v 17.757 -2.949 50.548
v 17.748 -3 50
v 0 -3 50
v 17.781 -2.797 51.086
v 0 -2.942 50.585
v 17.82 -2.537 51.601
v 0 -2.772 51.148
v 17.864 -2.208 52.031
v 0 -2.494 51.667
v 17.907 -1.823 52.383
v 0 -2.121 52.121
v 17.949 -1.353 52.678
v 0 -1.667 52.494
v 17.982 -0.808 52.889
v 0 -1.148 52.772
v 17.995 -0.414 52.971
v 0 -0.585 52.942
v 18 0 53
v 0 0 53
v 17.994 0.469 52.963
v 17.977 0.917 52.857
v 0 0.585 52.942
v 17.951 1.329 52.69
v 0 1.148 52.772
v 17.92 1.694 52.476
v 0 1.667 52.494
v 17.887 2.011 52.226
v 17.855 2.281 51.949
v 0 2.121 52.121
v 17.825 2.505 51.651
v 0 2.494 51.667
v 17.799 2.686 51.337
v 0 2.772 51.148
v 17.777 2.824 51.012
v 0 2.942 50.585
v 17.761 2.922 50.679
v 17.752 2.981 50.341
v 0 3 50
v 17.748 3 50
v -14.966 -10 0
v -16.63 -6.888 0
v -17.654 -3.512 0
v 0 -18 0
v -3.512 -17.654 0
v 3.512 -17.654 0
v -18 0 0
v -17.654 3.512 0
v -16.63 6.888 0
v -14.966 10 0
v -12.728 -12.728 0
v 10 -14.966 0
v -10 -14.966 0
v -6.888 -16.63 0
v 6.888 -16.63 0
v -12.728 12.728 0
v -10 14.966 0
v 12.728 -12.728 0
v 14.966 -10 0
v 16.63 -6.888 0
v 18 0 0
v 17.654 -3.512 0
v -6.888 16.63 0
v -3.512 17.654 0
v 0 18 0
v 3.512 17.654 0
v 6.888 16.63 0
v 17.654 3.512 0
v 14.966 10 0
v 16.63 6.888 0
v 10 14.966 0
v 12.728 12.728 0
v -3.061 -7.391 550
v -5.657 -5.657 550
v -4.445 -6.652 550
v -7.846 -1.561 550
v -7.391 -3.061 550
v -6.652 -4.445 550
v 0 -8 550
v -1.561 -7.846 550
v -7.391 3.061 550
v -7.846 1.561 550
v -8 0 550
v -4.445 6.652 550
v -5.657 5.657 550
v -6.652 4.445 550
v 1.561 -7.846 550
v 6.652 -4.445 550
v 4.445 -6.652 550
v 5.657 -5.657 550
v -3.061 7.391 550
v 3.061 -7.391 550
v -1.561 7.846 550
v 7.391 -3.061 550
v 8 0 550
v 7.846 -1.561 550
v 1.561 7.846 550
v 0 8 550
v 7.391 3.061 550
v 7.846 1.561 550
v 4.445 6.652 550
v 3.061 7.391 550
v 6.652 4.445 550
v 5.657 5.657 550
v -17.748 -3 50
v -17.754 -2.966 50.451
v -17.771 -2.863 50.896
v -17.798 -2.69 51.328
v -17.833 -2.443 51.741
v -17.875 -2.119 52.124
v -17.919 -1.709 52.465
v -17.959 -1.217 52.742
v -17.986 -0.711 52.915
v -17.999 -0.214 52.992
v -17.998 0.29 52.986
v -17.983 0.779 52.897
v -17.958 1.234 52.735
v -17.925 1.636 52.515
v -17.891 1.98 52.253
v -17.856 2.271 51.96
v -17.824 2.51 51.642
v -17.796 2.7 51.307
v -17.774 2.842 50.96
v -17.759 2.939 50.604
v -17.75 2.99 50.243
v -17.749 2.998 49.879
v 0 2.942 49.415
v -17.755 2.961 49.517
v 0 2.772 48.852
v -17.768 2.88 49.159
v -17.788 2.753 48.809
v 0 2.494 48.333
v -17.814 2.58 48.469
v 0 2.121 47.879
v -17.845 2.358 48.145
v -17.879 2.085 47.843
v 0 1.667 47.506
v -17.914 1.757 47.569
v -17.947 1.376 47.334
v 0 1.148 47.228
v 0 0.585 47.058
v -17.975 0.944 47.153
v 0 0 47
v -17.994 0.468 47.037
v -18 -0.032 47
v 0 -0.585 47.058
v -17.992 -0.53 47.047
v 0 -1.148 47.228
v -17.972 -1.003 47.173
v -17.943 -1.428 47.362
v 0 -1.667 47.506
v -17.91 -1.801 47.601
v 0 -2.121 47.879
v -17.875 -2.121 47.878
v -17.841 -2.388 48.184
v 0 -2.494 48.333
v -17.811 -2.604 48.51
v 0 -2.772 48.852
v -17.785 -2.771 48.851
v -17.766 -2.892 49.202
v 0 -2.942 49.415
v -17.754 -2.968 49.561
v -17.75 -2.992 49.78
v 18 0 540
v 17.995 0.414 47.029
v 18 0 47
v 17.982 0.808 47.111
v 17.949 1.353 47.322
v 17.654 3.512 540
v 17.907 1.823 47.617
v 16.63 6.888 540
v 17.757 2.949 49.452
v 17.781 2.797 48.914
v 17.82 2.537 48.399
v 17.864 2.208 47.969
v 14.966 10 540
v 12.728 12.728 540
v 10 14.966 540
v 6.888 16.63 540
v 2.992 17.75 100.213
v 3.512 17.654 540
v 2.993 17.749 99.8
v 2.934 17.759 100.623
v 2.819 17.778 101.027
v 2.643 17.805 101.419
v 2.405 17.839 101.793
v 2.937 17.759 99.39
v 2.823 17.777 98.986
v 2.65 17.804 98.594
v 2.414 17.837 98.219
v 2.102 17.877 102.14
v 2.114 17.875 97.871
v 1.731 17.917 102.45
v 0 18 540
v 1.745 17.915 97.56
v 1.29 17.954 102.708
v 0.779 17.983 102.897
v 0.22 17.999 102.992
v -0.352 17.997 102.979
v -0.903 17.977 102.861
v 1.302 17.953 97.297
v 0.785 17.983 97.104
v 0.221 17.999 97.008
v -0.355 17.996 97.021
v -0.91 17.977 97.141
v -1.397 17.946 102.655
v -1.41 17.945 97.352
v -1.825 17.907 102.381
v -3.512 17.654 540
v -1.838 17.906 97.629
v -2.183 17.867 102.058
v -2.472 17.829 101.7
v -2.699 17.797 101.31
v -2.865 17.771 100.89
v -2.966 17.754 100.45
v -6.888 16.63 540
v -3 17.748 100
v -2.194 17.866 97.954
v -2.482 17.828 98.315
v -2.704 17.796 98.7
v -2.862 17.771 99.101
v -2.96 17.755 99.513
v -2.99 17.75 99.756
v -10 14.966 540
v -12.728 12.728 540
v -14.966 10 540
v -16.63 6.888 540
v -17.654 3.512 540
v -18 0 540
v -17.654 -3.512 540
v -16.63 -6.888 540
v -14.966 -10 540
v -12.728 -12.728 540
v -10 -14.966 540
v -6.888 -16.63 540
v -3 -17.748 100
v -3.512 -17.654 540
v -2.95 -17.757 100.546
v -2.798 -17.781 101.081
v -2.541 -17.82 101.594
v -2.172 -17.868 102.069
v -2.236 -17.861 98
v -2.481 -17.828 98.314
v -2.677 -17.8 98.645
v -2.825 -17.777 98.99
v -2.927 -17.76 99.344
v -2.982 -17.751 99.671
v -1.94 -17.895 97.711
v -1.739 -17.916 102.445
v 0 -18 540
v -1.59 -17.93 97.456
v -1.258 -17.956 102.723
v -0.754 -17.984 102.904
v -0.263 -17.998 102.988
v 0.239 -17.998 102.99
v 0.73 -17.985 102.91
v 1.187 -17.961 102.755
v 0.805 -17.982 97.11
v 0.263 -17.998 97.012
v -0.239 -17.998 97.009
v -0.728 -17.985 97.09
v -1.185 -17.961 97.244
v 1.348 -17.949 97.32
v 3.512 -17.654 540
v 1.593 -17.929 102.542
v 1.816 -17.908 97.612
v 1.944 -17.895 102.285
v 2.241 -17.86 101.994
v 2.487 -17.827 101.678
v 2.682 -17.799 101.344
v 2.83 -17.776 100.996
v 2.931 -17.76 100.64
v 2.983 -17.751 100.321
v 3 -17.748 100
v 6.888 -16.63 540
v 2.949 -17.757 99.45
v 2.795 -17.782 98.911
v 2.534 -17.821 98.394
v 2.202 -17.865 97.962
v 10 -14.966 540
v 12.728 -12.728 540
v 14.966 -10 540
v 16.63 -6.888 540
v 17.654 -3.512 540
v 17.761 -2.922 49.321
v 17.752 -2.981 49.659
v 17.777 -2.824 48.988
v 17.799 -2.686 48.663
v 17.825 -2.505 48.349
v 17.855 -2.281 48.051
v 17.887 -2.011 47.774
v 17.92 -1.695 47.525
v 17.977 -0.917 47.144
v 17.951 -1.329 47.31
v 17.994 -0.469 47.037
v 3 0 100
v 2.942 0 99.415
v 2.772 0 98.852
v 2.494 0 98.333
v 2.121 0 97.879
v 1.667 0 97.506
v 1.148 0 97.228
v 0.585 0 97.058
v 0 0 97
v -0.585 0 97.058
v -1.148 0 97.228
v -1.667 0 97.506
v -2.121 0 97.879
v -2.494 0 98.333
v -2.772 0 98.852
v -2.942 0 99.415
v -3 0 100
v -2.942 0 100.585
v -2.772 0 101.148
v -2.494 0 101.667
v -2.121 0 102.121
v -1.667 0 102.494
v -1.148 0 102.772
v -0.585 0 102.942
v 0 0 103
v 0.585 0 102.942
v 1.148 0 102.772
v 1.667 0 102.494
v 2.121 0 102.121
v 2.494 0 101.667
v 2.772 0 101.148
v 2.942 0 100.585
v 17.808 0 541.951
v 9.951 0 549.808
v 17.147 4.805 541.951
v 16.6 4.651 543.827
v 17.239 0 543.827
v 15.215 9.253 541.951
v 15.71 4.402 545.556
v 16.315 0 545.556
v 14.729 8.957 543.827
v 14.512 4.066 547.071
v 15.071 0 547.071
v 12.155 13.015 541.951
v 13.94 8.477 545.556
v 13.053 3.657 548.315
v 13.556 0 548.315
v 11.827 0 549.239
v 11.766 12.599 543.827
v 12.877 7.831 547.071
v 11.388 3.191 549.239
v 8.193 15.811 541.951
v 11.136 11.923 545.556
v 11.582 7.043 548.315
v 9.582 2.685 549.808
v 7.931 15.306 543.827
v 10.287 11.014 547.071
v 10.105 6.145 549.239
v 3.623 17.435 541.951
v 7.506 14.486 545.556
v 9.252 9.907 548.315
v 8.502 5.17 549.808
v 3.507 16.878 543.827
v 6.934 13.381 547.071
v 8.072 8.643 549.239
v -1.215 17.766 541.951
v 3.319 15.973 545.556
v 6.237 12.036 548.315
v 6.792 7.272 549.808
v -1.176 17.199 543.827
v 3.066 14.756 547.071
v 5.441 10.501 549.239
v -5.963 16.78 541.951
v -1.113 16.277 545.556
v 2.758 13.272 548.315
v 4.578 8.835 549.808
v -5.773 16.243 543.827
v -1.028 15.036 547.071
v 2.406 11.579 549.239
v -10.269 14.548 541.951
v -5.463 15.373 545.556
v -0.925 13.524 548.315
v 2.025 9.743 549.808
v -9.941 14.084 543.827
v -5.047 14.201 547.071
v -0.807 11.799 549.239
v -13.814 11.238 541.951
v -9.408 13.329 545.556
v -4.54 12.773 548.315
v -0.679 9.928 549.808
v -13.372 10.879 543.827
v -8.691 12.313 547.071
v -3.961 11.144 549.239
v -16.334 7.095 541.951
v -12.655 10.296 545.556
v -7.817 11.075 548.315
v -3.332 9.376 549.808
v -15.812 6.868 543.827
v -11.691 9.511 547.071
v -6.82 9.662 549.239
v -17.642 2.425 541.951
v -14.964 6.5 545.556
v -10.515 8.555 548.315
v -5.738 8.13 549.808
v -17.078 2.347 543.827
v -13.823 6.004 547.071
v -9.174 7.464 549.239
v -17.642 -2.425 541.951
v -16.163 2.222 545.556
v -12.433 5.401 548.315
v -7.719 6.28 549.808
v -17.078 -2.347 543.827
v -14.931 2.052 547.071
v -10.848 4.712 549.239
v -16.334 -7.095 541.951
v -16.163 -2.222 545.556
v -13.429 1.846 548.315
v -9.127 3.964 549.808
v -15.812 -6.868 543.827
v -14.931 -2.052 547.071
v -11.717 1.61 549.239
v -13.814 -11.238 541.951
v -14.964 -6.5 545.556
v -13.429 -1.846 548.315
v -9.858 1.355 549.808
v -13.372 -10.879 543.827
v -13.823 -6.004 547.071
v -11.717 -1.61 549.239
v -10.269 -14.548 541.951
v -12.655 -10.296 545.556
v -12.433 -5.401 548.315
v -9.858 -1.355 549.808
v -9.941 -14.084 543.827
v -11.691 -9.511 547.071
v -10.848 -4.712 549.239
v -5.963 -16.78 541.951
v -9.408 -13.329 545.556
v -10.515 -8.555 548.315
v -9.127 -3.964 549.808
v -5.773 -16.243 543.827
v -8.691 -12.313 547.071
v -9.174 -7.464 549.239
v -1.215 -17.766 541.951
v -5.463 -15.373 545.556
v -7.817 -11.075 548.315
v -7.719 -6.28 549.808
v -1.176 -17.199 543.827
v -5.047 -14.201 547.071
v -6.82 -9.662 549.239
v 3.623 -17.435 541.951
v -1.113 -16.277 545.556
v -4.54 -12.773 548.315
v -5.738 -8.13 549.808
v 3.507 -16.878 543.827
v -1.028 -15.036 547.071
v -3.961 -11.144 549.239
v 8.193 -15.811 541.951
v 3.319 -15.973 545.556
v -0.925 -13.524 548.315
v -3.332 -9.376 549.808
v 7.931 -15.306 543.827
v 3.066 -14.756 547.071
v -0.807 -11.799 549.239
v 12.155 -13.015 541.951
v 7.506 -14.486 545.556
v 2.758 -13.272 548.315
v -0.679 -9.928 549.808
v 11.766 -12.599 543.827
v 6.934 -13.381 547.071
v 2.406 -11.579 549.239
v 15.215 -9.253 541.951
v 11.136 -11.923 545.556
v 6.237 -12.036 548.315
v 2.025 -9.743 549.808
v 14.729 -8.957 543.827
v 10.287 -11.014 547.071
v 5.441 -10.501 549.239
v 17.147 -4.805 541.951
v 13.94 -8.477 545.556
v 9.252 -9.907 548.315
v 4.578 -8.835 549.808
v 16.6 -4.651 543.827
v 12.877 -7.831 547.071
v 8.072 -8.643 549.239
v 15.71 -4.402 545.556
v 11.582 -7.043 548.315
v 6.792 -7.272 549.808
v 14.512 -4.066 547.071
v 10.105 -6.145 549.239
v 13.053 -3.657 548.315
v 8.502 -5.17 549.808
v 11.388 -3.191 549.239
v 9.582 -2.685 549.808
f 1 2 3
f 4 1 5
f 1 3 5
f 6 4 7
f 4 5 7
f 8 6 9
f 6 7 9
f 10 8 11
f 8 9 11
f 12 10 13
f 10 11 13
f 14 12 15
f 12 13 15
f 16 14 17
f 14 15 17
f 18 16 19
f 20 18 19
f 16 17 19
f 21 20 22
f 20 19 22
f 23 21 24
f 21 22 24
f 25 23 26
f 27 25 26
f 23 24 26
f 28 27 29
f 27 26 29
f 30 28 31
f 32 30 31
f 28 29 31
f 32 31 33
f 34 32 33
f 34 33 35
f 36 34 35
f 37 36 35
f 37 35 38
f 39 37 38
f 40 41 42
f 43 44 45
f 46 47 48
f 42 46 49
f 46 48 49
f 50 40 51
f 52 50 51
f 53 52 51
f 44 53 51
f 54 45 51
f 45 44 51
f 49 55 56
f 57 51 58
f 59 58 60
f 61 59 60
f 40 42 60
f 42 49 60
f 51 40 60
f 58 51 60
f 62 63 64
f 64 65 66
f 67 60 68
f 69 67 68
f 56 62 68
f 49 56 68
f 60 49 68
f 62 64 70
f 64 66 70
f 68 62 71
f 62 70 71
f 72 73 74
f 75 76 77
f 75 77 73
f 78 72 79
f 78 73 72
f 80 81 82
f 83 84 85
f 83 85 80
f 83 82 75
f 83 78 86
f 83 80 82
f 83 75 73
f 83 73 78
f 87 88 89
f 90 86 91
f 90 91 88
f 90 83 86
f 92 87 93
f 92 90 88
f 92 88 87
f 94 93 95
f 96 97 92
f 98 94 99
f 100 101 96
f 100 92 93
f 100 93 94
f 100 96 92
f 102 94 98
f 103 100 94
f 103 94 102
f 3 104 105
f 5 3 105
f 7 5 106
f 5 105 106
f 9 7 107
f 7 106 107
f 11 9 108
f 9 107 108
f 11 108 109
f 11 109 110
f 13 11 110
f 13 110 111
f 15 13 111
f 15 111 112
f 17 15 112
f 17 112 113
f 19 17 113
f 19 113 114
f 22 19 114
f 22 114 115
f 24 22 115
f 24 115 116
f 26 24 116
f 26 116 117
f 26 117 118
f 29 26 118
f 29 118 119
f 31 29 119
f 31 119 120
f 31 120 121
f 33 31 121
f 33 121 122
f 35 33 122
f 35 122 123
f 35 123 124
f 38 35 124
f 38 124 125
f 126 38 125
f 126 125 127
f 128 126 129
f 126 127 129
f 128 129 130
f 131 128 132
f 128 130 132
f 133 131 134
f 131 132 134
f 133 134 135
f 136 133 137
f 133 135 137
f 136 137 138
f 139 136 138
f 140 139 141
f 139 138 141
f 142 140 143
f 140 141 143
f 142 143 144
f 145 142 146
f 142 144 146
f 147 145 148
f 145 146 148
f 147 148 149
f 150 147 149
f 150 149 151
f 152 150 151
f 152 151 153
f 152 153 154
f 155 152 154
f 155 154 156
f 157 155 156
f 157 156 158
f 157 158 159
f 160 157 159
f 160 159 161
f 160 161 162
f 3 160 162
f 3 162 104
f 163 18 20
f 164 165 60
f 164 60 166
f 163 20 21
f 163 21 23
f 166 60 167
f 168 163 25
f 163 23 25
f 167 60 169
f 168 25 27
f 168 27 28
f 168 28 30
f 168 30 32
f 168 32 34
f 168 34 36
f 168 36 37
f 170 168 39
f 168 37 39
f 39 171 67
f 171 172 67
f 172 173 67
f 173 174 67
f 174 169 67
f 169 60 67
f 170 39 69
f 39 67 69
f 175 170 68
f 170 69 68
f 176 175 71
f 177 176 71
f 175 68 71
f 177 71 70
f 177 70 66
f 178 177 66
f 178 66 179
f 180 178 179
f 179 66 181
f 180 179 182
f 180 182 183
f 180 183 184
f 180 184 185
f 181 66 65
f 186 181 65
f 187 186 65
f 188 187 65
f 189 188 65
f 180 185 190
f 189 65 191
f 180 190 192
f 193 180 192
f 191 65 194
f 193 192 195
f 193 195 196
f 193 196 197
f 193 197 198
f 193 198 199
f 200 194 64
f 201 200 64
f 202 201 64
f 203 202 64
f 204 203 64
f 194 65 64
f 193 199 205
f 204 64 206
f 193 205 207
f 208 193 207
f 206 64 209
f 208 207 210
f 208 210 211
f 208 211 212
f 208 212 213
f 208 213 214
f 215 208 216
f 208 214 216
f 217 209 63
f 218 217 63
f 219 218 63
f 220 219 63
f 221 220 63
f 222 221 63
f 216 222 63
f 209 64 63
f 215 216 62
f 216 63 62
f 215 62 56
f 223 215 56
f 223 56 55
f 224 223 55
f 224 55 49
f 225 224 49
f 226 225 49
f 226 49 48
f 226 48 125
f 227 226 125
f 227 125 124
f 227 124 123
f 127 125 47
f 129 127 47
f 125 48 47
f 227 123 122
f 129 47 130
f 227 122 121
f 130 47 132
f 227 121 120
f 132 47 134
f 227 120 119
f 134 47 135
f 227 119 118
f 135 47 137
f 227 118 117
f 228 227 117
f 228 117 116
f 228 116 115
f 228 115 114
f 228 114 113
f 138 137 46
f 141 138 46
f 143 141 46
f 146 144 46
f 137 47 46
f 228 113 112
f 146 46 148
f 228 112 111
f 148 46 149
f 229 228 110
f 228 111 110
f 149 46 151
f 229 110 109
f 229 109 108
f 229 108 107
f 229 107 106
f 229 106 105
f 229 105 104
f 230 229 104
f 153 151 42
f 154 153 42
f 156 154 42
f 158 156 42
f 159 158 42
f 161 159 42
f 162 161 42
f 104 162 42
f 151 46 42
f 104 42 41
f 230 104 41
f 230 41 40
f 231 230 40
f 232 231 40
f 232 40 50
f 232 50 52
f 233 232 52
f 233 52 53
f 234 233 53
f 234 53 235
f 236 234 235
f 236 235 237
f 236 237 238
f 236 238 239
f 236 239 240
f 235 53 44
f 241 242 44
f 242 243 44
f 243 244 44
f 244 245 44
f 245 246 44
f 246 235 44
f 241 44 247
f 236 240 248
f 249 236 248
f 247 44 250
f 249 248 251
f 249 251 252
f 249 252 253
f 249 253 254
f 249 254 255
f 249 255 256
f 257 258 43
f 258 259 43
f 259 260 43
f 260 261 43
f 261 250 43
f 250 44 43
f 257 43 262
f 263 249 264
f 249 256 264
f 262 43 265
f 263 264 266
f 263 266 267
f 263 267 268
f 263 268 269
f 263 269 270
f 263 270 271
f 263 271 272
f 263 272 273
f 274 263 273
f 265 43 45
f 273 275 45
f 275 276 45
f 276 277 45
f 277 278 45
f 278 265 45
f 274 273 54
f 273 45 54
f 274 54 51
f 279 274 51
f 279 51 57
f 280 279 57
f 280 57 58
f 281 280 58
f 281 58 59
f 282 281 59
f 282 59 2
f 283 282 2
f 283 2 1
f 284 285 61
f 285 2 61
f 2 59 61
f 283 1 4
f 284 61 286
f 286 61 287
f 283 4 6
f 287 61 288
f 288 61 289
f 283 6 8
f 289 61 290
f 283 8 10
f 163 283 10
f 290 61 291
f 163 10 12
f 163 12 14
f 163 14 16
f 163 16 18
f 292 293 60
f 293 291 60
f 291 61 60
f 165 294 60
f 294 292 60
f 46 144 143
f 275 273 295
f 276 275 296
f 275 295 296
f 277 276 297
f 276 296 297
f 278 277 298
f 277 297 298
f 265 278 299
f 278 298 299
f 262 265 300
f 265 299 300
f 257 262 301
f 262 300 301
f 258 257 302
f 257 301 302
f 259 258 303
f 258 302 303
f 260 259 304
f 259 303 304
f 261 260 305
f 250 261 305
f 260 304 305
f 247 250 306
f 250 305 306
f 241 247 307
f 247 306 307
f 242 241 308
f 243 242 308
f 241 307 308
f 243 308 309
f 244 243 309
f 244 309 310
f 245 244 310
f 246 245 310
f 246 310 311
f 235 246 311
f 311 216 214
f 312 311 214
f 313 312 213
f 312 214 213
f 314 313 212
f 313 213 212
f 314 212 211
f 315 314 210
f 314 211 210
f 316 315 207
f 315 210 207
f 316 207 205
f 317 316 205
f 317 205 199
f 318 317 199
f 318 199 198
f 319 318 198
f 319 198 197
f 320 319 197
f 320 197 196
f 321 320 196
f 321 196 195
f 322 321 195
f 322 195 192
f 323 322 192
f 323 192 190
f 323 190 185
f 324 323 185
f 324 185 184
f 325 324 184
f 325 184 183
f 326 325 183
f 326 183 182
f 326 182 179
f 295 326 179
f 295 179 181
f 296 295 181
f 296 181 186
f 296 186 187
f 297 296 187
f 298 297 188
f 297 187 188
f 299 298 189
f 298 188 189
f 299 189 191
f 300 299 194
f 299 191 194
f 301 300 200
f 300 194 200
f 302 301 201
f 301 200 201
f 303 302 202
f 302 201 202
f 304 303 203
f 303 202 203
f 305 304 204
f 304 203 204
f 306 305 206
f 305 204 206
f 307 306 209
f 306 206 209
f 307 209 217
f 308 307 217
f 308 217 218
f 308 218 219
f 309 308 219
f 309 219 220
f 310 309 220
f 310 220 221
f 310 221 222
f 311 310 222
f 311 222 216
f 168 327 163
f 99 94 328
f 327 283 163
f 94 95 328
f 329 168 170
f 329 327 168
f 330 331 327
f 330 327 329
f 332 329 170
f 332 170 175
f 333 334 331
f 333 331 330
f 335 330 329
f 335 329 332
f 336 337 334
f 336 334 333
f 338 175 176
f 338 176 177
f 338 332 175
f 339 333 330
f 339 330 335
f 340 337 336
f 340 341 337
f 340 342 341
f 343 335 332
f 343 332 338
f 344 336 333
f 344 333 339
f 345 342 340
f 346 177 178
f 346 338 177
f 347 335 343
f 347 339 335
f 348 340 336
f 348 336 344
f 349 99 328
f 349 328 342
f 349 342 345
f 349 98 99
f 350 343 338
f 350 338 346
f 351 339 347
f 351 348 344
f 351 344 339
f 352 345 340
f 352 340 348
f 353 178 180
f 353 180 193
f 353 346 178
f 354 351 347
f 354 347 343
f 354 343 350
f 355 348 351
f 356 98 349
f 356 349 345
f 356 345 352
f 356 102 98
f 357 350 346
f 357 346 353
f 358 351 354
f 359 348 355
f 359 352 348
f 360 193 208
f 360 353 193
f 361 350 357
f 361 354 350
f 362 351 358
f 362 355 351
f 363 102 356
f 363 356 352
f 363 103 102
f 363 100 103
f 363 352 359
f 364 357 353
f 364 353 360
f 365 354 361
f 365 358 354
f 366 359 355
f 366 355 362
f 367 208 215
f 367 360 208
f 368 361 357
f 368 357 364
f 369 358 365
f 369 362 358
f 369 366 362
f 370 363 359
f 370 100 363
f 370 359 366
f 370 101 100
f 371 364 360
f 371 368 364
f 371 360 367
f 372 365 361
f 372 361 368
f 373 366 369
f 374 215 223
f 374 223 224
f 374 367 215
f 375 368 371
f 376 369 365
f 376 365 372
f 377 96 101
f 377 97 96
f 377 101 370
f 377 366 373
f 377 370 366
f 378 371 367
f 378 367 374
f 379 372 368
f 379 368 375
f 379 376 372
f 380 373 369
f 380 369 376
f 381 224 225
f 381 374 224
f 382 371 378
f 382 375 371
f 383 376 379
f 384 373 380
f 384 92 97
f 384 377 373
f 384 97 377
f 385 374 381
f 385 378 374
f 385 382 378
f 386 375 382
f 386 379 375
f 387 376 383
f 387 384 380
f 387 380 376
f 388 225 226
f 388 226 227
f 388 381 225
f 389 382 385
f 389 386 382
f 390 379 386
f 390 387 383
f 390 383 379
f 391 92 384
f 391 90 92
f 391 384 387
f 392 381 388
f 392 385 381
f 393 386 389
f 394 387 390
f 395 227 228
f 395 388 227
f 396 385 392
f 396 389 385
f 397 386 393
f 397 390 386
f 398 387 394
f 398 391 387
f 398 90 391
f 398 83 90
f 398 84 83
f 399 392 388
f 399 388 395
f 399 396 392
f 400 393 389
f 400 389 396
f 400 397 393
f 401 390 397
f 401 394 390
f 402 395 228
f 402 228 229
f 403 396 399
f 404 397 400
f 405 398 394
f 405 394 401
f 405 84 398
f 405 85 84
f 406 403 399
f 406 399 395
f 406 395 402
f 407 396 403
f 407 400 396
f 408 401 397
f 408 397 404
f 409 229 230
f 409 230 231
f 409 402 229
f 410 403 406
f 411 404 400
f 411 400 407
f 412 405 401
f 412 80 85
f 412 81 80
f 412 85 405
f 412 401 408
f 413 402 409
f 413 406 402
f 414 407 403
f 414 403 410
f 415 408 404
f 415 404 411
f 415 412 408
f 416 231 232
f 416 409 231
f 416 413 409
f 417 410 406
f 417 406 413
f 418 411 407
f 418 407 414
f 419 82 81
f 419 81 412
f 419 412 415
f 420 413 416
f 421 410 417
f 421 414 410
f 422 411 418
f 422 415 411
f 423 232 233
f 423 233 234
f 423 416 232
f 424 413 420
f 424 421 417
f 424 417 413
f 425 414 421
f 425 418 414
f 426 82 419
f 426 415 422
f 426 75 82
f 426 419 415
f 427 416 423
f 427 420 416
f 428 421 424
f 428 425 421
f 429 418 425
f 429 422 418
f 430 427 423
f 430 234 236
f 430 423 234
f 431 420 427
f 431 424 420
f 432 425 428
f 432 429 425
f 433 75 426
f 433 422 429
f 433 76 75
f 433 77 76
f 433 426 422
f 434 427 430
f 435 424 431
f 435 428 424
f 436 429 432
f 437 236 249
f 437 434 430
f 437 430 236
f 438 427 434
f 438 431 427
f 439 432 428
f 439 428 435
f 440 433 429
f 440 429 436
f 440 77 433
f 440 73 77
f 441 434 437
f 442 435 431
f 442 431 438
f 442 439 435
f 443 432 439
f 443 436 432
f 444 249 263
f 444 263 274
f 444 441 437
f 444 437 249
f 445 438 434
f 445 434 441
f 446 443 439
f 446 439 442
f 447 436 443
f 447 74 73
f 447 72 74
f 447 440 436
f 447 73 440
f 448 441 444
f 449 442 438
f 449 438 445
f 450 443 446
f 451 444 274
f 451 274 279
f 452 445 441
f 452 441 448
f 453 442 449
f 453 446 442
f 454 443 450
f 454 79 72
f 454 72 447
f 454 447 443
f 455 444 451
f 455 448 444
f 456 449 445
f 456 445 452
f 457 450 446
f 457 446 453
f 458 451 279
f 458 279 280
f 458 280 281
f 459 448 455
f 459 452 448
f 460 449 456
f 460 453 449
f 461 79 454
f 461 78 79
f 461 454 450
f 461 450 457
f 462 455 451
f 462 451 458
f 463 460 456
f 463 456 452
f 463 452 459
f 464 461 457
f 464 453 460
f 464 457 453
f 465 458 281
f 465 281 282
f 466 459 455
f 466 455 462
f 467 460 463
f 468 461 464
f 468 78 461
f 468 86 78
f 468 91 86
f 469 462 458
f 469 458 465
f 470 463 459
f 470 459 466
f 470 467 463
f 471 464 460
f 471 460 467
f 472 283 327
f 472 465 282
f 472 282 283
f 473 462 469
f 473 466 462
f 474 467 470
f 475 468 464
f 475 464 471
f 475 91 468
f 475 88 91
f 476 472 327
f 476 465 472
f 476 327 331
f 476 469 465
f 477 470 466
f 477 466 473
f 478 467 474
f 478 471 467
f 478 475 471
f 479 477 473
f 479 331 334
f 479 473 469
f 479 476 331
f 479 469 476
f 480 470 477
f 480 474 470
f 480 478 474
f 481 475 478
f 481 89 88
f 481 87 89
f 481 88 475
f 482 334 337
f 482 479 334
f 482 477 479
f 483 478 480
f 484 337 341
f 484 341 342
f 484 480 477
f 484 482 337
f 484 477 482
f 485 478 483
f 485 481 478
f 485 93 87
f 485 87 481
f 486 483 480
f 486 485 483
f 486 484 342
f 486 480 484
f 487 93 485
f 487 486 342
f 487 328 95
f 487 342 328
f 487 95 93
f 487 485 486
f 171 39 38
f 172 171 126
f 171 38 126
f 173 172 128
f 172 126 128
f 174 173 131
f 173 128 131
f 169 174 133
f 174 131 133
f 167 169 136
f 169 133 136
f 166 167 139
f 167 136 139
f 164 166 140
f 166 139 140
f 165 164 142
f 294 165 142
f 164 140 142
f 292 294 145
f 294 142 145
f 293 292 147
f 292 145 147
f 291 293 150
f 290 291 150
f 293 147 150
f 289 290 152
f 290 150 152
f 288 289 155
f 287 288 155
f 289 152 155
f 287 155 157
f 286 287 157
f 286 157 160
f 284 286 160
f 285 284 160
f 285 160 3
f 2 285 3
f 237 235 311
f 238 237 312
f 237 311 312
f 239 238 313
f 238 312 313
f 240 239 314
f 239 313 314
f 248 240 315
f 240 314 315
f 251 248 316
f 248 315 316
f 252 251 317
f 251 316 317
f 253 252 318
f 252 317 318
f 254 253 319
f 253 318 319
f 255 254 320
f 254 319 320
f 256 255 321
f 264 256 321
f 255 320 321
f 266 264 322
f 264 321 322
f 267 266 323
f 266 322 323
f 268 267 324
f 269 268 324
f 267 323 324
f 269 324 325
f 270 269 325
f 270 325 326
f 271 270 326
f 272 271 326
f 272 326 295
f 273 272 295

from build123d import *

# Parameters (mm, degrees)
F0_R     = 18
F1_DEPTH = 550
F2_R     = 10
F4_D     = 6
F4_DEPTH = 18.001
F5_D     = 6
F7_D     = 6
F7_DEPTH = 18.0010001
F8_D     = 6


with BuildPart() as f1:
    # F0 (on Top) → F1 (new body)
    with BuildSketch(Plane.XY):
        Circle(F0_R)
    extrude(amount=F1_DEPTH)

    # F2
    f2_edges = [f1.edges().sort_by_distance(p)[0] for p in [
        (-18, 0, 550),
    ]]
    fillet(f2_edges, radius=F2_R)

    # F4 (through all, one way)
    with BuildSketch(Plane(origin=(0, 0, 0), x_dir=(1, 0, 0), z_dir=(0, 1, 0))):
        with Locations((0, -100)):
            Circle(F4_D / 2)
    extrude(amount=-F4_DEPTH, mode=Mode.SUBTRACT)

    # F5 (through all)
    with Locations(Plane.XZ):
        with Locations((0, 100)):
            Hole(F5_D / 2)

    # F7 (through all, one way)
    with BuildSketch(Plane(origin=(0, 0, 0), x_dir=(0, 1, 0), z_dir=(-1, 0, 0))):
        with Locations((0, -50)):
            Circle(F7_D / 2)
    extrude(amount=-F7_DEPTH, mode=Mode.SUBTRACT)

    # F8 (through all)
    with Locations(Plane.YZ):
        with Locations((0, 50)):
            Hole(F8_D / 2)


solid = f1.part
